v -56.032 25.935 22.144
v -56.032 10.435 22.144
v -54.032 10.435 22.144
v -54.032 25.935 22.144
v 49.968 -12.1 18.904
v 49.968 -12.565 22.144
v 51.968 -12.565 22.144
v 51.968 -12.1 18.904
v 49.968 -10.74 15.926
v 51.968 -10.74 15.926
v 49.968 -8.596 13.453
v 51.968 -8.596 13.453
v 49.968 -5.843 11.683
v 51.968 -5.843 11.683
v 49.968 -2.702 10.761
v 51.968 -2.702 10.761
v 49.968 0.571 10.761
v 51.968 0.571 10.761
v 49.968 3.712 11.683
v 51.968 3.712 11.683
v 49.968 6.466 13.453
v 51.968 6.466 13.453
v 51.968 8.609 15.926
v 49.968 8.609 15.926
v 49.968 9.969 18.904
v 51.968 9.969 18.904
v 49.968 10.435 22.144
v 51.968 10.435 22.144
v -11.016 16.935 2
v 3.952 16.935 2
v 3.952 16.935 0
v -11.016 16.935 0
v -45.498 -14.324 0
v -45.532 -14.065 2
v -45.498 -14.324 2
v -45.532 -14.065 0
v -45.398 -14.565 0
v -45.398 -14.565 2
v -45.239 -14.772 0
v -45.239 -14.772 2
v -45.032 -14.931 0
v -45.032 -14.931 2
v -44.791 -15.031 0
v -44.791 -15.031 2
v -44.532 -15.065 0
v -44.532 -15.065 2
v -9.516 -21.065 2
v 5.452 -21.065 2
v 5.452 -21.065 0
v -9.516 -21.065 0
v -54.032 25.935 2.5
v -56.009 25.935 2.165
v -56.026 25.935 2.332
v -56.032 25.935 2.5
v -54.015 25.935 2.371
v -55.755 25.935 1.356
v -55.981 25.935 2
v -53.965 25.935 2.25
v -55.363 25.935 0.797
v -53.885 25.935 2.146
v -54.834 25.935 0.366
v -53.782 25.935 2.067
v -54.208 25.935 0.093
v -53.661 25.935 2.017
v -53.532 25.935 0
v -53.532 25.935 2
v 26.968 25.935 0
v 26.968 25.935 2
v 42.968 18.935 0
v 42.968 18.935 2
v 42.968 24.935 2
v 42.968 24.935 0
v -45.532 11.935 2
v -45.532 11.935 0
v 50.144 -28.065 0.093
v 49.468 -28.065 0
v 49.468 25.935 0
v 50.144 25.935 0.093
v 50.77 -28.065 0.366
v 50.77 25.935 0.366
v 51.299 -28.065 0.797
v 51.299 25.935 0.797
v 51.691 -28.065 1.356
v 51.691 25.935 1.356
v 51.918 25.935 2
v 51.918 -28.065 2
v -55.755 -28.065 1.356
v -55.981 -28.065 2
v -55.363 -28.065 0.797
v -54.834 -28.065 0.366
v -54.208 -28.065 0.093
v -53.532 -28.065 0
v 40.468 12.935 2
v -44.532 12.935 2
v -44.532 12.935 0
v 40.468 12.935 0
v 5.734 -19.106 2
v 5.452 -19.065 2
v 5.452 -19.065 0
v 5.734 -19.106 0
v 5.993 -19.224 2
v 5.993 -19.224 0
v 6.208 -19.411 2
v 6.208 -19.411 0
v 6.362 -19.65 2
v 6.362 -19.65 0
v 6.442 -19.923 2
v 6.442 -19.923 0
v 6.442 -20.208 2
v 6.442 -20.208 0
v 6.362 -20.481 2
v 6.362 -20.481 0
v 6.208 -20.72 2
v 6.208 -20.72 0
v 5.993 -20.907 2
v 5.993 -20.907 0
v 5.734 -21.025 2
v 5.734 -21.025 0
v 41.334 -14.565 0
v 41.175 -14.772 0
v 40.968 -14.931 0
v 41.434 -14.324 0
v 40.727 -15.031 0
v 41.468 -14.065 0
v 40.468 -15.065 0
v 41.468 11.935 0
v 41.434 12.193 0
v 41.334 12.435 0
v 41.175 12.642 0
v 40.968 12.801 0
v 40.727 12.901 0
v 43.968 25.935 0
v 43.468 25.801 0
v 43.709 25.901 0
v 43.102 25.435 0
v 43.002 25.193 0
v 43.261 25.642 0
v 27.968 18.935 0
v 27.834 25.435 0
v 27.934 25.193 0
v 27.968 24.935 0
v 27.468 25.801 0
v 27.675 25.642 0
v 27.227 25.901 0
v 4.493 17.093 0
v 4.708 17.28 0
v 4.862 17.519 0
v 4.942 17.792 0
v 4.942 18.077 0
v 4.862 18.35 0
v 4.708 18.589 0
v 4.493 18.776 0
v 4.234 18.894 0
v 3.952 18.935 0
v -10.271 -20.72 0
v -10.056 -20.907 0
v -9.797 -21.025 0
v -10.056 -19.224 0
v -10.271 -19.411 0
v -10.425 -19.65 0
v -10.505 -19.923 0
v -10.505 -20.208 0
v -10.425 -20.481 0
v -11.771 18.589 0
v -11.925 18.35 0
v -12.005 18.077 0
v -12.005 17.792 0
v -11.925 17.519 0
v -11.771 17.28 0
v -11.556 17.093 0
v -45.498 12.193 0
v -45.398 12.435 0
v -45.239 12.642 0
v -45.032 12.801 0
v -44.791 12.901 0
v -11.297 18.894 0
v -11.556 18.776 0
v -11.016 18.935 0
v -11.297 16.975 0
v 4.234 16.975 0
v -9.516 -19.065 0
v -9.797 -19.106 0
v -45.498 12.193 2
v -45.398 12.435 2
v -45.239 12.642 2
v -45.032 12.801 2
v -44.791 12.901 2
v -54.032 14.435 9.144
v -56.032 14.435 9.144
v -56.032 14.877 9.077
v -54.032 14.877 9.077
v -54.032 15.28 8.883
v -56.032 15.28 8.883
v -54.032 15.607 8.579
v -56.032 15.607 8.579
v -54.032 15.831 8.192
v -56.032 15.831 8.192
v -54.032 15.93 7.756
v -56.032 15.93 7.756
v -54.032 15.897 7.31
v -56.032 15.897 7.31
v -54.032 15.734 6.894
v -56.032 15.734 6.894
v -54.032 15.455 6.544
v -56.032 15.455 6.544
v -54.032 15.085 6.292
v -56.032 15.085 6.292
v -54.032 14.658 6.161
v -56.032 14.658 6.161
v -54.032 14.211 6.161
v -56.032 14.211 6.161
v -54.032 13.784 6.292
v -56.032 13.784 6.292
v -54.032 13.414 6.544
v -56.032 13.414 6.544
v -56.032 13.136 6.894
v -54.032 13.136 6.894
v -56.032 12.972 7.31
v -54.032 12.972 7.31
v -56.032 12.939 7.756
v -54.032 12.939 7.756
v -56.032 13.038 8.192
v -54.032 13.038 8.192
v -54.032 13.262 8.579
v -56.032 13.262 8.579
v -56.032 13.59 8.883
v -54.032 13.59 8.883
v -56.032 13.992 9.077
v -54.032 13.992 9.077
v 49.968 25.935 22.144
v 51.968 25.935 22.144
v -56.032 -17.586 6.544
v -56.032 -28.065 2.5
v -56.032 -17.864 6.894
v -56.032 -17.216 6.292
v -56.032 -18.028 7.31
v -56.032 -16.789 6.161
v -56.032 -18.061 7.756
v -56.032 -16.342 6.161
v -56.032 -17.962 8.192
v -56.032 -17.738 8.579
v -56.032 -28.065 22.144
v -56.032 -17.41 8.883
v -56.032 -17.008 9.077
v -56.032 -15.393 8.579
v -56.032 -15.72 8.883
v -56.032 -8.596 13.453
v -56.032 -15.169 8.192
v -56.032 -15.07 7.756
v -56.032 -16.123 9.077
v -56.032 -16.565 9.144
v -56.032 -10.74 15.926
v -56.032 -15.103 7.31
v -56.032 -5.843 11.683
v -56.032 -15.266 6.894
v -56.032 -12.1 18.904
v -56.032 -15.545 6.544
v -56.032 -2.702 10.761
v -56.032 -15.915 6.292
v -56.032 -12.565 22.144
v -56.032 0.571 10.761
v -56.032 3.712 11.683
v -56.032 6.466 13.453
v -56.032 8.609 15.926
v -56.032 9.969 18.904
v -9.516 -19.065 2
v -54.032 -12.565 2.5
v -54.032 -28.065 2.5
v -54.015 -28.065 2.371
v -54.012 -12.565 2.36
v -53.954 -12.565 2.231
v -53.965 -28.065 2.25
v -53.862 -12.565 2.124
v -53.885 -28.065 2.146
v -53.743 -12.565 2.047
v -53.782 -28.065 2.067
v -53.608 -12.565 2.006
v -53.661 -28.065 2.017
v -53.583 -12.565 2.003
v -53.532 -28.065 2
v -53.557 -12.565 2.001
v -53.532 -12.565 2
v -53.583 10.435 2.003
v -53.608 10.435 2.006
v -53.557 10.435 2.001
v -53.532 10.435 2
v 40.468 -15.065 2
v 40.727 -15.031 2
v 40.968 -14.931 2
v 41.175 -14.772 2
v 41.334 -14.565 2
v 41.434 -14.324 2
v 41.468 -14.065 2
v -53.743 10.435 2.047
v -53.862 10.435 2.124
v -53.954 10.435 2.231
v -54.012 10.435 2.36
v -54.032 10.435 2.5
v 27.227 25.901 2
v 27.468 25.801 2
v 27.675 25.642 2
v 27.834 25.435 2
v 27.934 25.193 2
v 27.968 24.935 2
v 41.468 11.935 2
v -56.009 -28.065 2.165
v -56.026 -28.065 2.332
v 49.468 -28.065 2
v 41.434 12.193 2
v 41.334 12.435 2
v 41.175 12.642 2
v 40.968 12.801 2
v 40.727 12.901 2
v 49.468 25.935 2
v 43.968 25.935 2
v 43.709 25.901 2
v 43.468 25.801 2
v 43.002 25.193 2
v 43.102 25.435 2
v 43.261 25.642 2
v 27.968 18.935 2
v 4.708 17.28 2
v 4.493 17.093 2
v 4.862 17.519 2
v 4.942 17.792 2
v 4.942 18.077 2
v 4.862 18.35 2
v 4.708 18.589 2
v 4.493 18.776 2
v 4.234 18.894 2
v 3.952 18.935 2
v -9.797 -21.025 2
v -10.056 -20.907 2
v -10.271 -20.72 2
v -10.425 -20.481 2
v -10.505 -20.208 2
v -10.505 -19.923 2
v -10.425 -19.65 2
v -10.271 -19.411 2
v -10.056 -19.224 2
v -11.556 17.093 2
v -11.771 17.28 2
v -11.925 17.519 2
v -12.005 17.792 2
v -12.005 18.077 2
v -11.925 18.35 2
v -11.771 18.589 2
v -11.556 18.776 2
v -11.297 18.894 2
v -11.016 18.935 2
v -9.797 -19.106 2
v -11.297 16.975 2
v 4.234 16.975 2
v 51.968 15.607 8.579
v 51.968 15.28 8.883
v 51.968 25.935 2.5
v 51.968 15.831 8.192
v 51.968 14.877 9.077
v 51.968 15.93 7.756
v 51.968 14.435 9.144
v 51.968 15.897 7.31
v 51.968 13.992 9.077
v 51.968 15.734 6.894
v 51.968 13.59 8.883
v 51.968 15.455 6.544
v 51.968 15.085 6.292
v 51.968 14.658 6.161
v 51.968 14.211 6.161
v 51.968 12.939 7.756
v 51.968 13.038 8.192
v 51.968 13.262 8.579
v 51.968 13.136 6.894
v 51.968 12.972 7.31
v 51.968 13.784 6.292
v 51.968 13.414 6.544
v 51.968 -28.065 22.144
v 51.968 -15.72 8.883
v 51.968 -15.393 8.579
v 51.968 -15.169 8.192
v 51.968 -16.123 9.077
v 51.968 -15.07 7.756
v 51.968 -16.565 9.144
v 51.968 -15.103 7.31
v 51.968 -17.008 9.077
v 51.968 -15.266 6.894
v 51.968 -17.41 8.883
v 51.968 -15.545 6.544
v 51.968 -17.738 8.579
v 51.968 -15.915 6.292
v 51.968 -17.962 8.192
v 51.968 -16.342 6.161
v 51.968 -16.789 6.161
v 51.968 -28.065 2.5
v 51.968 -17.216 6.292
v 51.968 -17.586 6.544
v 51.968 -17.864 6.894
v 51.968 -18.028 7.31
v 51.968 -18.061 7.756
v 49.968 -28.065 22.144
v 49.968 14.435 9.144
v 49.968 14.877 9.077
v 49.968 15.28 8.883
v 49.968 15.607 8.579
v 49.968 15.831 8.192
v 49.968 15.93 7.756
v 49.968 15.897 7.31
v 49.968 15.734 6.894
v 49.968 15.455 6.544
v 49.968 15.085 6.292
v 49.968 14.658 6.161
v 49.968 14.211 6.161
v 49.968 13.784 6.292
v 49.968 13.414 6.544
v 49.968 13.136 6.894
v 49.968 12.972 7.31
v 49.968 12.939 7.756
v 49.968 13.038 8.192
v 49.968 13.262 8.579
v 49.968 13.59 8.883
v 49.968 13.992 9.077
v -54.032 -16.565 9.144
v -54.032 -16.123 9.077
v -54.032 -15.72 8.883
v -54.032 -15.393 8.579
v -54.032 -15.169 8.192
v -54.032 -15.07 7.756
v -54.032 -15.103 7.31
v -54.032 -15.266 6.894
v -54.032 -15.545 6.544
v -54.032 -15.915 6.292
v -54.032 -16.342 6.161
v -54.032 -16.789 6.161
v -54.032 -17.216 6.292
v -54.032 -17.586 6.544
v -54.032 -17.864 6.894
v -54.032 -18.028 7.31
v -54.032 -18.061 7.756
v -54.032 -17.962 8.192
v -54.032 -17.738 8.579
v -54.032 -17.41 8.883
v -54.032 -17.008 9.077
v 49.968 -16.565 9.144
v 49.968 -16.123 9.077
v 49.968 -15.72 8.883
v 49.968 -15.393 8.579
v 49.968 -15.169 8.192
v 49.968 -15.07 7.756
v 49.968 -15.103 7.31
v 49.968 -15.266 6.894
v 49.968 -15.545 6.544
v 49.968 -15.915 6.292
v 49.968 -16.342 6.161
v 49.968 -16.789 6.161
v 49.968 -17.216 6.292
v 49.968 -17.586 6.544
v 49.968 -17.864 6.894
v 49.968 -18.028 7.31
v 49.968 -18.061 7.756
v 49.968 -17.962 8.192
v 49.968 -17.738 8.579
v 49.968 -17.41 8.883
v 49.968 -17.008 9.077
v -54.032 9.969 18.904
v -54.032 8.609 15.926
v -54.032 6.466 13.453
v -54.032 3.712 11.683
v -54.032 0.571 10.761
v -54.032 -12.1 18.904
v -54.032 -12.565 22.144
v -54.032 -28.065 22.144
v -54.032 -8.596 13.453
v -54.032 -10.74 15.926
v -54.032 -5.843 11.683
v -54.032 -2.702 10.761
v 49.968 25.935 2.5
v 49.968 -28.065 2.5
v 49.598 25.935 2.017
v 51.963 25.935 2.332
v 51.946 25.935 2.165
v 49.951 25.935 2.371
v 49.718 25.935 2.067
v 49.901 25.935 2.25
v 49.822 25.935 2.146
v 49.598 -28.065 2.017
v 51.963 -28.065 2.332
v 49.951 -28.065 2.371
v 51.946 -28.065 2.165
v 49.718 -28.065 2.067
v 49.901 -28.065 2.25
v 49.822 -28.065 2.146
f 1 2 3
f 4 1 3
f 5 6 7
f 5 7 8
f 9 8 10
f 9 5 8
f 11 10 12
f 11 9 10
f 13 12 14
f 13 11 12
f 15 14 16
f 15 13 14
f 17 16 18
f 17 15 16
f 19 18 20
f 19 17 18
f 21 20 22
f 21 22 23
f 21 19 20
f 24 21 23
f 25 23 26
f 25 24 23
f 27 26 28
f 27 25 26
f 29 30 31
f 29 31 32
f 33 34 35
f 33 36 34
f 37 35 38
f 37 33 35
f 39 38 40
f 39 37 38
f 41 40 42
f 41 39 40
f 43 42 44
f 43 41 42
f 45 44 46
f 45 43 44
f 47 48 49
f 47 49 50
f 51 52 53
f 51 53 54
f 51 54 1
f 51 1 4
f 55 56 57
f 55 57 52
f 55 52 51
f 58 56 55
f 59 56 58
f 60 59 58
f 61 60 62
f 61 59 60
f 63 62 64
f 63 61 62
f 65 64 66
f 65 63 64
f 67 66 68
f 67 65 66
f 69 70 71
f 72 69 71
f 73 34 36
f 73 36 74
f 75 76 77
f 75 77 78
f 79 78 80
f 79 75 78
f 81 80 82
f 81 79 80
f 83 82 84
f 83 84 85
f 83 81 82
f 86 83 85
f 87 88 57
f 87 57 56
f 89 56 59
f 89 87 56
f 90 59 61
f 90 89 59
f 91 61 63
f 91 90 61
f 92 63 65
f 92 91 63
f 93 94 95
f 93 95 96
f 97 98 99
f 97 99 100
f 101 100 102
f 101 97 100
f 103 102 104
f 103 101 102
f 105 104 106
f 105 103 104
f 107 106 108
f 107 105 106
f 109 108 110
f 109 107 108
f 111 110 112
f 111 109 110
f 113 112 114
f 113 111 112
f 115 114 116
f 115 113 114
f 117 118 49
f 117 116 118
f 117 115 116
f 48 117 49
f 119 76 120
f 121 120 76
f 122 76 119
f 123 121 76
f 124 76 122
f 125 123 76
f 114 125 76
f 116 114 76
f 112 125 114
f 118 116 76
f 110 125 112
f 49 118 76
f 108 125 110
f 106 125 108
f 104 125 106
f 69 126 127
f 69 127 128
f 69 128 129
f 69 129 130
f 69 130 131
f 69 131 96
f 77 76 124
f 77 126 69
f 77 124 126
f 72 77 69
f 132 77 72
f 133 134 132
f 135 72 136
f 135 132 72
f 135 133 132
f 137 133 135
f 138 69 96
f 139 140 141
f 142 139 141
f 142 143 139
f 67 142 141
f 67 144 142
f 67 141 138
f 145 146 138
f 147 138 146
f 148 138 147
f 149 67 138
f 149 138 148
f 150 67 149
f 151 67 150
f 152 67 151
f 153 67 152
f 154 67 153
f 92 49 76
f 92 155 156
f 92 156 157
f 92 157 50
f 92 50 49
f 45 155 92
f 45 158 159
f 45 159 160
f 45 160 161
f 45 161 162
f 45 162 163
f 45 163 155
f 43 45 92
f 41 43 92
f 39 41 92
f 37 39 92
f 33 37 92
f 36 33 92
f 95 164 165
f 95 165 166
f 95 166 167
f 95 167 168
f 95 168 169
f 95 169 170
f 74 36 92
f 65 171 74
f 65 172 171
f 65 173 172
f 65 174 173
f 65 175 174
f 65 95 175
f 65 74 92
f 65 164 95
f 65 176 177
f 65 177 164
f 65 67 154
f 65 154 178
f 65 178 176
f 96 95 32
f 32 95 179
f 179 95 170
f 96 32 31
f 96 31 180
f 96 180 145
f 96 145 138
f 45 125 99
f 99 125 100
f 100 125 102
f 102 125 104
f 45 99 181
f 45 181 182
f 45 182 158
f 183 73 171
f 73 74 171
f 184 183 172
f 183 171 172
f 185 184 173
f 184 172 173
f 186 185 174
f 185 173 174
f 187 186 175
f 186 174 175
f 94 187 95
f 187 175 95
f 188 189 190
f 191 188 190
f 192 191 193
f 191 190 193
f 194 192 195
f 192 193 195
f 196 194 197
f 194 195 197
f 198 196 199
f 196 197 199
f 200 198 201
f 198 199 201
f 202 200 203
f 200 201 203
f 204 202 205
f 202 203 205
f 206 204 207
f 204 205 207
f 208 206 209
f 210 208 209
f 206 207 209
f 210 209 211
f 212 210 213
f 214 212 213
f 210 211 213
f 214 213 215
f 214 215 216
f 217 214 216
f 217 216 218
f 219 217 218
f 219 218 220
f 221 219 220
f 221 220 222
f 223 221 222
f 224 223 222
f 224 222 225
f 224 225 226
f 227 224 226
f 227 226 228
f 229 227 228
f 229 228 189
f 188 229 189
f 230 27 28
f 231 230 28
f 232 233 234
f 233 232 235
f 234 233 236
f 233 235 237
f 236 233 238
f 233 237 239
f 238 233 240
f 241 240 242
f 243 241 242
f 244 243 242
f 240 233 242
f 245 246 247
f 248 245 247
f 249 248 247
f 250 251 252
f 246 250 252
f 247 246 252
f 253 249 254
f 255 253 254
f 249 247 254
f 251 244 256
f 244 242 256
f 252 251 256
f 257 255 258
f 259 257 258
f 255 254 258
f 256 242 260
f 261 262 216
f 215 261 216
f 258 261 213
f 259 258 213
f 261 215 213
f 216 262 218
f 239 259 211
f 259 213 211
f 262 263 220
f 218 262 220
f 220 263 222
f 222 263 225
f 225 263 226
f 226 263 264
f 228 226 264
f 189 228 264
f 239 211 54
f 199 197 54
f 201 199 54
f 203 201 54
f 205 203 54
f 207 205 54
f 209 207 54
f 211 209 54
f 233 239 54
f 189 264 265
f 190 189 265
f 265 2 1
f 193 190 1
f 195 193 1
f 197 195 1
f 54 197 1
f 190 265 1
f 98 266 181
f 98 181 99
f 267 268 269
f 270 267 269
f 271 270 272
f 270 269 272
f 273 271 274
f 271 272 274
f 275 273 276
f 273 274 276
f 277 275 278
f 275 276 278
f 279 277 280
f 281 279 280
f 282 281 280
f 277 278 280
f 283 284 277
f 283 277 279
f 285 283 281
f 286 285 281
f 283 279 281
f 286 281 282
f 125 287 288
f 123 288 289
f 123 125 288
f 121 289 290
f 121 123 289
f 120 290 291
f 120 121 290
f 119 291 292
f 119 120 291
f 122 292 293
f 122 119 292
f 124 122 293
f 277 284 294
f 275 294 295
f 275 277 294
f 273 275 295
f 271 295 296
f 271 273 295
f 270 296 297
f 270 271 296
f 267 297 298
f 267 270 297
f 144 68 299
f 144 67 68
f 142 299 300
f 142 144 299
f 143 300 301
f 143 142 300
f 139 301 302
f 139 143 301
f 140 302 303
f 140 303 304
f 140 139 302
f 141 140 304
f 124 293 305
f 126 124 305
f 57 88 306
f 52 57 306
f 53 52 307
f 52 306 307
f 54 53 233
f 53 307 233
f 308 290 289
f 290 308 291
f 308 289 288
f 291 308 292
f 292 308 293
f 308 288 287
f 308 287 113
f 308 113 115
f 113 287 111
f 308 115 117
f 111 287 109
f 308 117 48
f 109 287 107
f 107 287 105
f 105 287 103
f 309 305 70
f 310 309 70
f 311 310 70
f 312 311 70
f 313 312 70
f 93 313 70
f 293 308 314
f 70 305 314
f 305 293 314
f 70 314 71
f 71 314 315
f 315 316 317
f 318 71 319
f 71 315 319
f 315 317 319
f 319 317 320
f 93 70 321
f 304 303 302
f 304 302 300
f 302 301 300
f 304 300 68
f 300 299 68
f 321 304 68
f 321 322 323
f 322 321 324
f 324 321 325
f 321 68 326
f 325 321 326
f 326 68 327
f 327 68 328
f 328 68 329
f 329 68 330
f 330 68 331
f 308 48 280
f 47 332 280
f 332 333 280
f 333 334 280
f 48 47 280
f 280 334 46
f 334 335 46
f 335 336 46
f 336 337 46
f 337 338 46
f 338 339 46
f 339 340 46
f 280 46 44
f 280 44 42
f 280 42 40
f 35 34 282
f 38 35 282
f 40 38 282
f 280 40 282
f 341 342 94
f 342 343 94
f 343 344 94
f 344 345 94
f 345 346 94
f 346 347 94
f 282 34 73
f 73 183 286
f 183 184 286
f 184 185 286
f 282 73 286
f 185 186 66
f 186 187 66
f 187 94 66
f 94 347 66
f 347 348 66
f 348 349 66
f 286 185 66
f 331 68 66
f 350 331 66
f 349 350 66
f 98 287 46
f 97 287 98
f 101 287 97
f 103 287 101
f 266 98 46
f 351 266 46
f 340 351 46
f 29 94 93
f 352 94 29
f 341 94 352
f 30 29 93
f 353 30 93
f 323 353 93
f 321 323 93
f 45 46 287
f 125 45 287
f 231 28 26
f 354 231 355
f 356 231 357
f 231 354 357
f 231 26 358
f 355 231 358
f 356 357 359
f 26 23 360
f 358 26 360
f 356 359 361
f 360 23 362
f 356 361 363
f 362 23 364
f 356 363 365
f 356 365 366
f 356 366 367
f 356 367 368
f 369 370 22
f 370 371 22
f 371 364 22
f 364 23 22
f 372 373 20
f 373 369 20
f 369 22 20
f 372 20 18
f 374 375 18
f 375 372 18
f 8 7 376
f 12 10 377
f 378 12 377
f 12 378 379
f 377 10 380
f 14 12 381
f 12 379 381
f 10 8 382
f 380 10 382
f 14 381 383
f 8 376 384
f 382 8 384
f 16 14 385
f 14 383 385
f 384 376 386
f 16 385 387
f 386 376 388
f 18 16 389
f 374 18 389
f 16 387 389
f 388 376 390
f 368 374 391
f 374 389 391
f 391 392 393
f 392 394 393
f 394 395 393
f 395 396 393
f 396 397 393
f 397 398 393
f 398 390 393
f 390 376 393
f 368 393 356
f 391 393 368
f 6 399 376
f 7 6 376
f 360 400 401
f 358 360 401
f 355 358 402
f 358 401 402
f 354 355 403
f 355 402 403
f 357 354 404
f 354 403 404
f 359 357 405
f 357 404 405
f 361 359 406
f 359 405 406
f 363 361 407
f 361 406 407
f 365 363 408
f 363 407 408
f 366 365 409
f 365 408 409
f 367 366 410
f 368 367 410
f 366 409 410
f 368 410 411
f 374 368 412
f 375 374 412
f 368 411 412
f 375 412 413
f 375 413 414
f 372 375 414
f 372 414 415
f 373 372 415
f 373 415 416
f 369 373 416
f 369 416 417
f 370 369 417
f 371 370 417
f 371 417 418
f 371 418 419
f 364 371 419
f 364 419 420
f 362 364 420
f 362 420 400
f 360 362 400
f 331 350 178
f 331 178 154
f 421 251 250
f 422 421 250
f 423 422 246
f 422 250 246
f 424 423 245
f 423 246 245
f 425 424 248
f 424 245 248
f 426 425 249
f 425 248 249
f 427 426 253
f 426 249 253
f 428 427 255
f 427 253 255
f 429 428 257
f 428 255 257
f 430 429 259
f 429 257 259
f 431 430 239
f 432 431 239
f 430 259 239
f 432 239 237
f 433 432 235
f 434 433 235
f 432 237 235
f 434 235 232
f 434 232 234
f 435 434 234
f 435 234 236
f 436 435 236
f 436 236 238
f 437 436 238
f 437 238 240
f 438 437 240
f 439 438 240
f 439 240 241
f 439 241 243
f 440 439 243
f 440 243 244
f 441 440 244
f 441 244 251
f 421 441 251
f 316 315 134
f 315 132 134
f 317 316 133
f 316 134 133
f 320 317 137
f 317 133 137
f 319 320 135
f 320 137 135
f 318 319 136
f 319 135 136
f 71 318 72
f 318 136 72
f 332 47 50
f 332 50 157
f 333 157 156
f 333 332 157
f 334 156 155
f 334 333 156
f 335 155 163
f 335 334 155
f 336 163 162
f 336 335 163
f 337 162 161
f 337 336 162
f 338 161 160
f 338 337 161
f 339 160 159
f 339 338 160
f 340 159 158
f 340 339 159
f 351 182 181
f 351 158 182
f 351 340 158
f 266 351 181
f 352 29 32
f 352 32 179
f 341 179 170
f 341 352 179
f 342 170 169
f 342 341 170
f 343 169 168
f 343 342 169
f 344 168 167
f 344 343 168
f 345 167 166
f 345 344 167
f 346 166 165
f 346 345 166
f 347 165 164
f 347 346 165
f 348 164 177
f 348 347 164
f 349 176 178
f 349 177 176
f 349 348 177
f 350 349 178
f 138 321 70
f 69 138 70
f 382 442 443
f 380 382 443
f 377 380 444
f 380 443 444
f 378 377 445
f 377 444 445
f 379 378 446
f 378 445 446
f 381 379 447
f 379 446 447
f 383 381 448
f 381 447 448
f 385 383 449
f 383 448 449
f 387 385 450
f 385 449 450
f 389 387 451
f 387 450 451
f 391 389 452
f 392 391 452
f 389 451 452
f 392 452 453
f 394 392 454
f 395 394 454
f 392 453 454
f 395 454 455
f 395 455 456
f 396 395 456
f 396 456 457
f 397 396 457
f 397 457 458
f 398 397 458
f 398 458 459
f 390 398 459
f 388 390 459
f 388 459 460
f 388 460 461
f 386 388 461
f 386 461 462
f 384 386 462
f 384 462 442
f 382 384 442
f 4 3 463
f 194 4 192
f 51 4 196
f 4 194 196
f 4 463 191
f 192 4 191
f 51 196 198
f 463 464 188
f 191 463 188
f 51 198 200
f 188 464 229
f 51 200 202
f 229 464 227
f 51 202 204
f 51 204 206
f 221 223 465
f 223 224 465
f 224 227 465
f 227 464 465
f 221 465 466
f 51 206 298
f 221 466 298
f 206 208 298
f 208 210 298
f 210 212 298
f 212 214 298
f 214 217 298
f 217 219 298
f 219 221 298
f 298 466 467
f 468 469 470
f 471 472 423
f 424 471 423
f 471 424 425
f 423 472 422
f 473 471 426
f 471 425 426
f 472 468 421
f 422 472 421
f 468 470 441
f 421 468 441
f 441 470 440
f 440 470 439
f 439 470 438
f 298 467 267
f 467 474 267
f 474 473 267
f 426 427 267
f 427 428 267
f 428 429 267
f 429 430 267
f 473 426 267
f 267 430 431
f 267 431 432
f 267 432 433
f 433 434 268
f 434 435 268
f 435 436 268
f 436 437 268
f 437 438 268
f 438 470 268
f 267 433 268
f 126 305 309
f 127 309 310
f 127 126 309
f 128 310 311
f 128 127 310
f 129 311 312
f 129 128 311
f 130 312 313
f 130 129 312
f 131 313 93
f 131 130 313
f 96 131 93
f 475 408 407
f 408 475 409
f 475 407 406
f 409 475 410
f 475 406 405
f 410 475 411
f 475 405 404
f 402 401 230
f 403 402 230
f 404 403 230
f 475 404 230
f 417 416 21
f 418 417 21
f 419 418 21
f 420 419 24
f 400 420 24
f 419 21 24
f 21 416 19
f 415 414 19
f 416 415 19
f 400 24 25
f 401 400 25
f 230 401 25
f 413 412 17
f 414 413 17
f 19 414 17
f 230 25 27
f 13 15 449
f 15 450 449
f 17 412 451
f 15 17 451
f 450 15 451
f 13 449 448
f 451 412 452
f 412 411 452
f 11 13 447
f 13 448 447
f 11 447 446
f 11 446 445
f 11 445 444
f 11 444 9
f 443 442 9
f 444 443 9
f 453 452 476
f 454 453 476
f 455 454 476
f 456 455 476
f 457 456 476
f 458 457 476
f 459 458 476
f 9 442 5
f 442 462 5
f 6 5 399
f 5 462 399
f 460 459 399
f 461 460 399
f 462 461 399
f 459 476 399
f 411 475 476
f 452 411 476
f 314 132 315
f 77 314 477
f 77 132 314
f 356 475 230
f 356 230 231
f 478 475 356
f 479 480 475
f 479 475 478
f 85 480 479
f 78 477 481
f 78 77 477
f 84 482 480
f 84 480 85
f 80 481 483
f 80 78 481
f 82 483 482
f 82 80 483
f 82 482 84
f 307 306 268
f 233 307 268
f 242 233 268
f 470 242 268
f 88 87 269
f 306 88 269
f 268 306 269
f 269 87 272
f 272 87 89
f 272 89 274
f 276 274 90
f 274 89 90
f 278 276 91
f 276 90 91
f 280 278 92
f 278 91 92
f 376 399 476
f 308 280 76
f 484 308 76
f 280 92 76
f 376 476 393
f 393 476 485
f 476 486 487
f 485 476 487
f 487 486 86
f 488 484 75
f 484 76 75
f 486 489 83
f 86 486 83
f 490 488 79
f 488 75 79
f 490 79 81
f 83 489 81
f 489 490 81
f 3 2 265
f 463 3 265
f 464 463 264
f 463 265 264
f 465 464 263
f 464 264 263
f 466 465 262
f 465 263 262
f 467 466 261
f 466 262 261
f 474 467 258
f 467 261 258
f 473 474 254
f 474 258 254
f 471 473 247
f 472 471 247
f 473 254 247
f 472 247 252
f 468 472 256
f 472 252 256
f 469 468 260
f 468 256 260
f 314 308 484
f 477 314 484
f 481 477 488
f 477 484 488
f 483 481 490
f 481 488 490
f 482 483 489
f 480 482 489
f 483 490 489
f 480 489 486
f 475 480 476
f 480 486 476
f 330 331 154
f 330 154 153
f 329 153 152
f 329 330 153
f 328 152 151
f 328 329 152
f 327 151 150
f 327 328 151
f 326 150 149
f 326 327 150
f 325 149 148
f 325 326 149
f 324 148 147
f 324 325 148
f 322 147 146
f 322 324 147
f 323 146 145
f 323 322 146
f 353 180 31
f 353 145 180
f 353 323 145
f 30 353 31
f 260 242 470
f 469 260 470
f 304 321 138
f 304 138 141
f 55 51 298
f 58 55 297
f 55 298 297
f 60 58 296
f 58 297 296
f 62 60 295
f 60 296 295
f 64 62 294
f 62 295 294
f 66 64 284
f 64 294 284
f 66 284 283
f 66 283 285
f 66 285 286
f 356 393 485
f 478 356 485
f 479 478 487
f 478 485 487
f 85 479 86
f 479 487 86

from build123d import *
from build123d.topology import SkipClean

# Parameters (mm, degrees)
DODANIE_WYCI_GNI_CIE1_DEPTH = 2
SZKIC_START                 = -28.065385
SZKIC_ZGI_CIA1_DEPTH        = 54
SZKIC_ZGI_CIA1_2_DEPTH      = 15.5
SZKIC_START_2               = 10.434615
SZKIC_ZGI_CIA1_3_DEPTH      = 15.5
SZKIC_START_3               = -56.031828
SZKIC_ZGI_CIA1_4_DEPTH      = 2.423909
SZKIC_START_4               = -12.565385
SZKIC_ZGI_CIA1_5_DEPTH      = 23
SZKIC_ZGI_CIA1_6_DEPTH      = 23
SZKIC_ZGI_CIA2_DEPTH        = 54
SZKIC_ZGI_CIA2_2_DEPTH      = 54
SZKIC_START_5               = 49.968172
SZKIC_ZGI_CIA2_3_DEPTH      = 2
SZKIC9_W                    = 87
SZKIC9_H                    = 28
SZKIC9_W_2                  = 15
SZKIC9_H_2                  = 7
WYTNIJ_WYCI_GNI_CIE1_DEPTH  = 66.825561
SZKIC10_R                   = 1.5
WYTNIJ_WYCI_GNI_CIE2_DEPTH  = 114.762973
ZAOKR_GLENIE2_R             = 1
ZAOKR_GLENIE3_R             = 1


with BuildPart() as part:
    # Szkic1 → Dodanie-wyciągnięcie1 (new body)
    with BuildSketch(Plane.XY):
        with BuildLine():
            Line((-75.531828, 25.934615), (71.468172, 25.934615))
            Line((71.468172, 25.934615), (71.468172, 10.434615))
            ThreePointArc((71.468172, 10.434615), (59.968172, -1.065385), (71.468172, -12.565385))
            Line((71.468172, -12.565385), (71.468172, -28.065385))
            Line((71.468172, -28.065385), (-75.531828, -28.065385))
            Line((-75.531828, -28.065385), (-75.531828, -12.565385))
            ThreePointArc((-75.531828, -12.565385), (-64.031828, -1.065385), (-75.531828, 10.434615))
            Line((-75.531828, 10.434615), (-75.531828, 25.934615))
        make_face()
    extrude(amount=DODANIE_WYCI_GNI_CIE1_DEPTH)

    # Szkic zgięcia1: read off the stored shape, not the designer's step
    # Szkic zgięcia1 outline → Szkic zgięcia1 (cut)
    with BuildSketch(Plane(origin=(0, 0, 0), x_dir=(1, 0, 0), z_dir=(0, 1, 0)).offset(SZKIC_START)):
        with BuildLine():
            Line((-75.531828, -2), (-55.981318, -2))
            ThreePointArc((-55.981318, -2), (-55.112967, -0.563508), (-53.531828, 0))
            Line((-53.531828, 0), (-75.531828, 0))
            Line((-75.531828, 0), (-75.531828, -2))
        make_face()
    extrude(amount=SZKIC_ZGI_CIA1_DEPTH, mode=Mode.SUBTRACT)

    # Szkic zgi_cia1 2 outline → Szkic zgi_cia1 2 (add)
    with BuildSketch(Plane(origin=(0, 0, 0), x_dir=(1, 0, 0), z_dir=(0, 1, 0)).offset(SZKIC_START)):
        with BuildLine():
            ThreePointArc((-55.981318, -2), (-56.019168, -2.248728), (-56.031828, -2.5))
            Line((-56.031828, -2.5), (-56.031828, -22.143806))
            Line((-56.031828, -22.143806), (-54.031828, -22.143806))
            Line((-54.031828, -22.143806), (-54.031828, -2.5))
            ThreePointArc((-54.031828, -2.5), (-53.885381, -2.146447), (-53.531828, -2))
            Line((-53.531828, -2), (-55.981318, -2))
        make_face()
    extrude(amount=SZKIC_ZGI_CIA1_2_DEPTH)

    # Szkic zgi_cia1 3 outline → Szkic zgi_cia1 3 (add)
    with BuildSketch(Plane(origin=(0, 0, 0), x_dir=(1, 0, 0), z_dir=(0, 1, 0)).offset(SZKIC_START_2)):
        with BuildLine():
            ThreePointArc((-55.981318, -2), (-56.019168, -2.248728), (-56.031828, -2.5))
            Line((-56.031828, -2.5), (-56.031828, -22.143806))
            Line((-56.031828, -22.143806), (-54.031828, -22.143806))
            Line((-54.031828, -22.143806), (-54.031828, -2.5))
            ThreePointArc((-54.031828, -2.5), (-53.885381, -2.146447), (-53.531828, -2))
            Line((-53.531828, -2), (-55.981318, -2))
        make_face()
    extrude(amount=SZKIC_ZGI_CIA1_3_DEPTH)

    # Szkic zgi_cia1 4 outline → Szkic zgi_cia1 4 (add)
    with BuildSketch(Plane.YZ.offset(SZKIC_START_3)):
        with BuildLine():
            Line((10.434615, 2), (10.434615, 22.143806))
            ThreePointArc((10.434615, 22.143806), (-1.065385, 10.643806), (-12.565385, 22.143806))
            Line((-12.565385, 22.143806), (-12.565385, 2))
            Line((-12.565385, 2), (10.434615, 2))
        make_face()
    extrude(amount=SZKIC_ZGI_CIA1_4_DEPTH)

    # Szkic zgi_cia1 5 outline → Szkic zgi_cia1 5 (cut)
    with SkipClean():  # the faces are left unmerged after this step: merging them gives an invalid solid
        with BuildSketch(Plane(origin=(0, 0, 0), x_dir=(1, 0, 0), z_dir=(0, 1, 0)).offset(SZKIC_START_4)):
            with BuildLine():
                ThreePointArc((-53.607919, -2.005824), (-53.911331, -2.174459), (-54.031828, -2.5))
                Line((-54.031828, -2.5), (-54.031828, -24))
                Line((-54.031828, -24), (-53.607919, -24))
                Line((-53.607919, -24), (-53.607919, -2.005824))
            make_face()
            with BuildLine():
                Line((-58, -24), (-56.031828, -24))
                Line((-56.031828, -24), (-56.031828, -2.5))
                ThreePointArc((-56.031828, -2.5), (-56.019168, -2.248728), (-55.981318, -2))
                Line((-55.981318, -2), (-58, -2))
                Line((-58, -2), (-58, -24))
            make_face()
        extrude(amount=SZKIC_ZGI_CIA1_5_DEPTH, mode=Mode.SUBTRACT)

    # Szkic zgi_cia1 6 outline → Szkic zgi_cia1 6 (add)
    with SkipClean():  # the faces are left unmerged after this step: merging them gives an invalid solid
        with BuildSketch(Plane(origin=(0, 0, 0), x_dir=(1, 0, 0), z_dir=(0, 1, 0)).offset(SZKIC_START_4)):
            with BuildLine():
                Line((-53.607919, -2), (-53.607919, -2.005824))
                ThreePointArc((-53.607919, -2.005824), (-53.569985, -2.001458), (-53.531828, -2))
                Line((-53.531828, -2), (-53.607919, -2))
            make_face()
        extrude(amount=SZKIC_ZGI_CIA1_6_DEPTH)

    # Szkic zgięcia2: read off the stored shape, not the designer's step
    # Szkic zgięcia2 outline → Szkic zgięcia2 (cut)
    with SkipClean():  # the faces are left unmerged after this step: merging them gives an invalid solid
        with BuildSketch(Plane(origin=(0, 0, 0), x_dir=(1, 0, 0), z_dir=(0, 1, 0)).offset(SZKIC_START)):
            with BuildLine():
                ThreePointArc((49.468172, 0), (51.049311, -0.563508), (51.917662, -2))
                Line((51.917662, -2), (71.468172, -2))
                Line((71.468172, -2), (71.468172, 0))
                Line((71.468172, 0), (49.468172, 0))
            make_face()
        extrude(amount=SZKIC_ZGI_CIA2_DEPTH, mode=Mode.SUBTRACT)

    # Szkic zgi_cia2 2 outline → Szkic zgi_cia2 2 (add)
    with SkipClean():  # the faces are left unmerged after this step: merging them gives an invalid solid
        with BuildSketch(Plane(origin=(0, 0, 0), x_dir=(1, 0, 0), z_dir=(0, 1, 0)).offset(SZKIC_START)):
            with BuildLine():
                Line((49.968172, -22.143806), (51.968172, -22.143806))
                Line((51.968172, -22.143806), (51.968172, -2.5))
                ThreePointArc((51.968172, -2.5), (51.955512, -2.248728), (51.917662, -2))
                Line((51.917662, -2), (49.468172, -2))
                ThreePointArc((49.468172, -2), (49.821725, -2.146447), (49.968172, -2.5))
                Line((49.968172, -2.5), (49.968172, -22.143806))
            make_face()
        extrude(amount=SZKIC_ZGI_CIA2_2_DEPTH)

    # Szkic zgi_cia2 3 outline → Szkic zgi_cia2 3 (cut)
    with SkipClean():  # the faces are left unmerged after this step: merging them gives an invalid solid
        with BuildSketch(Plane.YZ.offset(SZKIC_START_5)):
            with BuildLine():
                Line((10.434615, 22.143806), (-12.565385, 22.143806))
                ThreePointArc((-12.565385, 22.143806), (-1.065385, 10.643806), (10.434615, 22.143806))
            make_face()
        extrude(amount=SZKIC_ZGI_CIA2_3_DEPTH, mode=Mode.SUBTRACT)

    # Szkic9 → Wytnij-wyciągnięcie1 (cut, through all)
    with SkipClean():  # the faces are left unmerged after this step: merging them gives an invalid solid
        with BuildSketch(Plane.XY.offset(2)):
            with Locations((-2.031828, -1.065385)):
                Rectangle(SZKIC9_W, SZKIC9_H)
            with Locations((35.468172, 22.434615)):
                Rectangle(SZKIC9_W_2, SZKIC9_H_2)
            with BuildLine():
                Line((-11.015655, 18.934615), (3.951999, 18.934615))
                ThreePointArc((3.951999, 18.934615), (4.951999, 17.934615), (3.951999, 16.934615))
                Line((3.951999, 16.934615), (-11.015655, 16.934615))
                ThreePointArc((-11.015655, 16.934615), (-12.015655, 17.934615), (-11.015655, 18.934615))
            make_face()
            with BuildLine():
                Line((-9.515655, -19.065385), (5.451999, -19.065385))
                ThreePointArc((5.451999, -19.065385), (6.451999, -20.065385), (5.451999, -21.065385))
                Line((5.451999, -21.065385), (-9.515655, -21.065385))
                ThreePointArc((-9.515655, -21.065385), (-10.515655, -20.065385), (-9.515655, -19.065385))
            make_face()
        extrude(amount=-WYTNIJ_WYCI_GNI_CIE1_DEPTH, mode=Mode.SUBTRACT)

    # Szkic10 → Wytnij-wyciągnięcie2 (cut, through all)
    with SkipClean():  # the faces are left unmerged after this step: merging them gives an invalid solid
        with BuildSketch(Plane.ZY.offset(56.031828)):
            with Locations((7.643806, 14.434615)):
                Circle(SZKIC10_R)
            with Locations((7.643806, -16.565385)):
                Circle(SZKIC10_R)
        extrude(amount=-WYTNIJ_WYCI_GNI_CIE2_DEPTH, mode=Mode.SUBTRACT)

    # Zaokrąglenie2
    zaokr_glenie2_edges = [part.edges().sort_by_distance(p)[0] for p in [
        (27.968172, 25.934615, 1),
        (42.968172, 25.934615, 1),
    ]]
    fillet(zaokr_glenie2_edges, radius=ZAOKR_GLENIE2_R)

    # Zaokrąglenie3
    zaokr_glenie3_edges = [part.edges().sort_by_distance(p)[0] for p in [
        (-45.531828, -15.065385, 1),
        (-45.531828, 12.934615, 1),
        (41.468172, 12.934615, 1),
        (41.468172, -15.065385, 1),
    ]]
    fillet(zaokr_glenie3_edges, radius=ZAOKR_GLENIE3_R)


solid = part.part
